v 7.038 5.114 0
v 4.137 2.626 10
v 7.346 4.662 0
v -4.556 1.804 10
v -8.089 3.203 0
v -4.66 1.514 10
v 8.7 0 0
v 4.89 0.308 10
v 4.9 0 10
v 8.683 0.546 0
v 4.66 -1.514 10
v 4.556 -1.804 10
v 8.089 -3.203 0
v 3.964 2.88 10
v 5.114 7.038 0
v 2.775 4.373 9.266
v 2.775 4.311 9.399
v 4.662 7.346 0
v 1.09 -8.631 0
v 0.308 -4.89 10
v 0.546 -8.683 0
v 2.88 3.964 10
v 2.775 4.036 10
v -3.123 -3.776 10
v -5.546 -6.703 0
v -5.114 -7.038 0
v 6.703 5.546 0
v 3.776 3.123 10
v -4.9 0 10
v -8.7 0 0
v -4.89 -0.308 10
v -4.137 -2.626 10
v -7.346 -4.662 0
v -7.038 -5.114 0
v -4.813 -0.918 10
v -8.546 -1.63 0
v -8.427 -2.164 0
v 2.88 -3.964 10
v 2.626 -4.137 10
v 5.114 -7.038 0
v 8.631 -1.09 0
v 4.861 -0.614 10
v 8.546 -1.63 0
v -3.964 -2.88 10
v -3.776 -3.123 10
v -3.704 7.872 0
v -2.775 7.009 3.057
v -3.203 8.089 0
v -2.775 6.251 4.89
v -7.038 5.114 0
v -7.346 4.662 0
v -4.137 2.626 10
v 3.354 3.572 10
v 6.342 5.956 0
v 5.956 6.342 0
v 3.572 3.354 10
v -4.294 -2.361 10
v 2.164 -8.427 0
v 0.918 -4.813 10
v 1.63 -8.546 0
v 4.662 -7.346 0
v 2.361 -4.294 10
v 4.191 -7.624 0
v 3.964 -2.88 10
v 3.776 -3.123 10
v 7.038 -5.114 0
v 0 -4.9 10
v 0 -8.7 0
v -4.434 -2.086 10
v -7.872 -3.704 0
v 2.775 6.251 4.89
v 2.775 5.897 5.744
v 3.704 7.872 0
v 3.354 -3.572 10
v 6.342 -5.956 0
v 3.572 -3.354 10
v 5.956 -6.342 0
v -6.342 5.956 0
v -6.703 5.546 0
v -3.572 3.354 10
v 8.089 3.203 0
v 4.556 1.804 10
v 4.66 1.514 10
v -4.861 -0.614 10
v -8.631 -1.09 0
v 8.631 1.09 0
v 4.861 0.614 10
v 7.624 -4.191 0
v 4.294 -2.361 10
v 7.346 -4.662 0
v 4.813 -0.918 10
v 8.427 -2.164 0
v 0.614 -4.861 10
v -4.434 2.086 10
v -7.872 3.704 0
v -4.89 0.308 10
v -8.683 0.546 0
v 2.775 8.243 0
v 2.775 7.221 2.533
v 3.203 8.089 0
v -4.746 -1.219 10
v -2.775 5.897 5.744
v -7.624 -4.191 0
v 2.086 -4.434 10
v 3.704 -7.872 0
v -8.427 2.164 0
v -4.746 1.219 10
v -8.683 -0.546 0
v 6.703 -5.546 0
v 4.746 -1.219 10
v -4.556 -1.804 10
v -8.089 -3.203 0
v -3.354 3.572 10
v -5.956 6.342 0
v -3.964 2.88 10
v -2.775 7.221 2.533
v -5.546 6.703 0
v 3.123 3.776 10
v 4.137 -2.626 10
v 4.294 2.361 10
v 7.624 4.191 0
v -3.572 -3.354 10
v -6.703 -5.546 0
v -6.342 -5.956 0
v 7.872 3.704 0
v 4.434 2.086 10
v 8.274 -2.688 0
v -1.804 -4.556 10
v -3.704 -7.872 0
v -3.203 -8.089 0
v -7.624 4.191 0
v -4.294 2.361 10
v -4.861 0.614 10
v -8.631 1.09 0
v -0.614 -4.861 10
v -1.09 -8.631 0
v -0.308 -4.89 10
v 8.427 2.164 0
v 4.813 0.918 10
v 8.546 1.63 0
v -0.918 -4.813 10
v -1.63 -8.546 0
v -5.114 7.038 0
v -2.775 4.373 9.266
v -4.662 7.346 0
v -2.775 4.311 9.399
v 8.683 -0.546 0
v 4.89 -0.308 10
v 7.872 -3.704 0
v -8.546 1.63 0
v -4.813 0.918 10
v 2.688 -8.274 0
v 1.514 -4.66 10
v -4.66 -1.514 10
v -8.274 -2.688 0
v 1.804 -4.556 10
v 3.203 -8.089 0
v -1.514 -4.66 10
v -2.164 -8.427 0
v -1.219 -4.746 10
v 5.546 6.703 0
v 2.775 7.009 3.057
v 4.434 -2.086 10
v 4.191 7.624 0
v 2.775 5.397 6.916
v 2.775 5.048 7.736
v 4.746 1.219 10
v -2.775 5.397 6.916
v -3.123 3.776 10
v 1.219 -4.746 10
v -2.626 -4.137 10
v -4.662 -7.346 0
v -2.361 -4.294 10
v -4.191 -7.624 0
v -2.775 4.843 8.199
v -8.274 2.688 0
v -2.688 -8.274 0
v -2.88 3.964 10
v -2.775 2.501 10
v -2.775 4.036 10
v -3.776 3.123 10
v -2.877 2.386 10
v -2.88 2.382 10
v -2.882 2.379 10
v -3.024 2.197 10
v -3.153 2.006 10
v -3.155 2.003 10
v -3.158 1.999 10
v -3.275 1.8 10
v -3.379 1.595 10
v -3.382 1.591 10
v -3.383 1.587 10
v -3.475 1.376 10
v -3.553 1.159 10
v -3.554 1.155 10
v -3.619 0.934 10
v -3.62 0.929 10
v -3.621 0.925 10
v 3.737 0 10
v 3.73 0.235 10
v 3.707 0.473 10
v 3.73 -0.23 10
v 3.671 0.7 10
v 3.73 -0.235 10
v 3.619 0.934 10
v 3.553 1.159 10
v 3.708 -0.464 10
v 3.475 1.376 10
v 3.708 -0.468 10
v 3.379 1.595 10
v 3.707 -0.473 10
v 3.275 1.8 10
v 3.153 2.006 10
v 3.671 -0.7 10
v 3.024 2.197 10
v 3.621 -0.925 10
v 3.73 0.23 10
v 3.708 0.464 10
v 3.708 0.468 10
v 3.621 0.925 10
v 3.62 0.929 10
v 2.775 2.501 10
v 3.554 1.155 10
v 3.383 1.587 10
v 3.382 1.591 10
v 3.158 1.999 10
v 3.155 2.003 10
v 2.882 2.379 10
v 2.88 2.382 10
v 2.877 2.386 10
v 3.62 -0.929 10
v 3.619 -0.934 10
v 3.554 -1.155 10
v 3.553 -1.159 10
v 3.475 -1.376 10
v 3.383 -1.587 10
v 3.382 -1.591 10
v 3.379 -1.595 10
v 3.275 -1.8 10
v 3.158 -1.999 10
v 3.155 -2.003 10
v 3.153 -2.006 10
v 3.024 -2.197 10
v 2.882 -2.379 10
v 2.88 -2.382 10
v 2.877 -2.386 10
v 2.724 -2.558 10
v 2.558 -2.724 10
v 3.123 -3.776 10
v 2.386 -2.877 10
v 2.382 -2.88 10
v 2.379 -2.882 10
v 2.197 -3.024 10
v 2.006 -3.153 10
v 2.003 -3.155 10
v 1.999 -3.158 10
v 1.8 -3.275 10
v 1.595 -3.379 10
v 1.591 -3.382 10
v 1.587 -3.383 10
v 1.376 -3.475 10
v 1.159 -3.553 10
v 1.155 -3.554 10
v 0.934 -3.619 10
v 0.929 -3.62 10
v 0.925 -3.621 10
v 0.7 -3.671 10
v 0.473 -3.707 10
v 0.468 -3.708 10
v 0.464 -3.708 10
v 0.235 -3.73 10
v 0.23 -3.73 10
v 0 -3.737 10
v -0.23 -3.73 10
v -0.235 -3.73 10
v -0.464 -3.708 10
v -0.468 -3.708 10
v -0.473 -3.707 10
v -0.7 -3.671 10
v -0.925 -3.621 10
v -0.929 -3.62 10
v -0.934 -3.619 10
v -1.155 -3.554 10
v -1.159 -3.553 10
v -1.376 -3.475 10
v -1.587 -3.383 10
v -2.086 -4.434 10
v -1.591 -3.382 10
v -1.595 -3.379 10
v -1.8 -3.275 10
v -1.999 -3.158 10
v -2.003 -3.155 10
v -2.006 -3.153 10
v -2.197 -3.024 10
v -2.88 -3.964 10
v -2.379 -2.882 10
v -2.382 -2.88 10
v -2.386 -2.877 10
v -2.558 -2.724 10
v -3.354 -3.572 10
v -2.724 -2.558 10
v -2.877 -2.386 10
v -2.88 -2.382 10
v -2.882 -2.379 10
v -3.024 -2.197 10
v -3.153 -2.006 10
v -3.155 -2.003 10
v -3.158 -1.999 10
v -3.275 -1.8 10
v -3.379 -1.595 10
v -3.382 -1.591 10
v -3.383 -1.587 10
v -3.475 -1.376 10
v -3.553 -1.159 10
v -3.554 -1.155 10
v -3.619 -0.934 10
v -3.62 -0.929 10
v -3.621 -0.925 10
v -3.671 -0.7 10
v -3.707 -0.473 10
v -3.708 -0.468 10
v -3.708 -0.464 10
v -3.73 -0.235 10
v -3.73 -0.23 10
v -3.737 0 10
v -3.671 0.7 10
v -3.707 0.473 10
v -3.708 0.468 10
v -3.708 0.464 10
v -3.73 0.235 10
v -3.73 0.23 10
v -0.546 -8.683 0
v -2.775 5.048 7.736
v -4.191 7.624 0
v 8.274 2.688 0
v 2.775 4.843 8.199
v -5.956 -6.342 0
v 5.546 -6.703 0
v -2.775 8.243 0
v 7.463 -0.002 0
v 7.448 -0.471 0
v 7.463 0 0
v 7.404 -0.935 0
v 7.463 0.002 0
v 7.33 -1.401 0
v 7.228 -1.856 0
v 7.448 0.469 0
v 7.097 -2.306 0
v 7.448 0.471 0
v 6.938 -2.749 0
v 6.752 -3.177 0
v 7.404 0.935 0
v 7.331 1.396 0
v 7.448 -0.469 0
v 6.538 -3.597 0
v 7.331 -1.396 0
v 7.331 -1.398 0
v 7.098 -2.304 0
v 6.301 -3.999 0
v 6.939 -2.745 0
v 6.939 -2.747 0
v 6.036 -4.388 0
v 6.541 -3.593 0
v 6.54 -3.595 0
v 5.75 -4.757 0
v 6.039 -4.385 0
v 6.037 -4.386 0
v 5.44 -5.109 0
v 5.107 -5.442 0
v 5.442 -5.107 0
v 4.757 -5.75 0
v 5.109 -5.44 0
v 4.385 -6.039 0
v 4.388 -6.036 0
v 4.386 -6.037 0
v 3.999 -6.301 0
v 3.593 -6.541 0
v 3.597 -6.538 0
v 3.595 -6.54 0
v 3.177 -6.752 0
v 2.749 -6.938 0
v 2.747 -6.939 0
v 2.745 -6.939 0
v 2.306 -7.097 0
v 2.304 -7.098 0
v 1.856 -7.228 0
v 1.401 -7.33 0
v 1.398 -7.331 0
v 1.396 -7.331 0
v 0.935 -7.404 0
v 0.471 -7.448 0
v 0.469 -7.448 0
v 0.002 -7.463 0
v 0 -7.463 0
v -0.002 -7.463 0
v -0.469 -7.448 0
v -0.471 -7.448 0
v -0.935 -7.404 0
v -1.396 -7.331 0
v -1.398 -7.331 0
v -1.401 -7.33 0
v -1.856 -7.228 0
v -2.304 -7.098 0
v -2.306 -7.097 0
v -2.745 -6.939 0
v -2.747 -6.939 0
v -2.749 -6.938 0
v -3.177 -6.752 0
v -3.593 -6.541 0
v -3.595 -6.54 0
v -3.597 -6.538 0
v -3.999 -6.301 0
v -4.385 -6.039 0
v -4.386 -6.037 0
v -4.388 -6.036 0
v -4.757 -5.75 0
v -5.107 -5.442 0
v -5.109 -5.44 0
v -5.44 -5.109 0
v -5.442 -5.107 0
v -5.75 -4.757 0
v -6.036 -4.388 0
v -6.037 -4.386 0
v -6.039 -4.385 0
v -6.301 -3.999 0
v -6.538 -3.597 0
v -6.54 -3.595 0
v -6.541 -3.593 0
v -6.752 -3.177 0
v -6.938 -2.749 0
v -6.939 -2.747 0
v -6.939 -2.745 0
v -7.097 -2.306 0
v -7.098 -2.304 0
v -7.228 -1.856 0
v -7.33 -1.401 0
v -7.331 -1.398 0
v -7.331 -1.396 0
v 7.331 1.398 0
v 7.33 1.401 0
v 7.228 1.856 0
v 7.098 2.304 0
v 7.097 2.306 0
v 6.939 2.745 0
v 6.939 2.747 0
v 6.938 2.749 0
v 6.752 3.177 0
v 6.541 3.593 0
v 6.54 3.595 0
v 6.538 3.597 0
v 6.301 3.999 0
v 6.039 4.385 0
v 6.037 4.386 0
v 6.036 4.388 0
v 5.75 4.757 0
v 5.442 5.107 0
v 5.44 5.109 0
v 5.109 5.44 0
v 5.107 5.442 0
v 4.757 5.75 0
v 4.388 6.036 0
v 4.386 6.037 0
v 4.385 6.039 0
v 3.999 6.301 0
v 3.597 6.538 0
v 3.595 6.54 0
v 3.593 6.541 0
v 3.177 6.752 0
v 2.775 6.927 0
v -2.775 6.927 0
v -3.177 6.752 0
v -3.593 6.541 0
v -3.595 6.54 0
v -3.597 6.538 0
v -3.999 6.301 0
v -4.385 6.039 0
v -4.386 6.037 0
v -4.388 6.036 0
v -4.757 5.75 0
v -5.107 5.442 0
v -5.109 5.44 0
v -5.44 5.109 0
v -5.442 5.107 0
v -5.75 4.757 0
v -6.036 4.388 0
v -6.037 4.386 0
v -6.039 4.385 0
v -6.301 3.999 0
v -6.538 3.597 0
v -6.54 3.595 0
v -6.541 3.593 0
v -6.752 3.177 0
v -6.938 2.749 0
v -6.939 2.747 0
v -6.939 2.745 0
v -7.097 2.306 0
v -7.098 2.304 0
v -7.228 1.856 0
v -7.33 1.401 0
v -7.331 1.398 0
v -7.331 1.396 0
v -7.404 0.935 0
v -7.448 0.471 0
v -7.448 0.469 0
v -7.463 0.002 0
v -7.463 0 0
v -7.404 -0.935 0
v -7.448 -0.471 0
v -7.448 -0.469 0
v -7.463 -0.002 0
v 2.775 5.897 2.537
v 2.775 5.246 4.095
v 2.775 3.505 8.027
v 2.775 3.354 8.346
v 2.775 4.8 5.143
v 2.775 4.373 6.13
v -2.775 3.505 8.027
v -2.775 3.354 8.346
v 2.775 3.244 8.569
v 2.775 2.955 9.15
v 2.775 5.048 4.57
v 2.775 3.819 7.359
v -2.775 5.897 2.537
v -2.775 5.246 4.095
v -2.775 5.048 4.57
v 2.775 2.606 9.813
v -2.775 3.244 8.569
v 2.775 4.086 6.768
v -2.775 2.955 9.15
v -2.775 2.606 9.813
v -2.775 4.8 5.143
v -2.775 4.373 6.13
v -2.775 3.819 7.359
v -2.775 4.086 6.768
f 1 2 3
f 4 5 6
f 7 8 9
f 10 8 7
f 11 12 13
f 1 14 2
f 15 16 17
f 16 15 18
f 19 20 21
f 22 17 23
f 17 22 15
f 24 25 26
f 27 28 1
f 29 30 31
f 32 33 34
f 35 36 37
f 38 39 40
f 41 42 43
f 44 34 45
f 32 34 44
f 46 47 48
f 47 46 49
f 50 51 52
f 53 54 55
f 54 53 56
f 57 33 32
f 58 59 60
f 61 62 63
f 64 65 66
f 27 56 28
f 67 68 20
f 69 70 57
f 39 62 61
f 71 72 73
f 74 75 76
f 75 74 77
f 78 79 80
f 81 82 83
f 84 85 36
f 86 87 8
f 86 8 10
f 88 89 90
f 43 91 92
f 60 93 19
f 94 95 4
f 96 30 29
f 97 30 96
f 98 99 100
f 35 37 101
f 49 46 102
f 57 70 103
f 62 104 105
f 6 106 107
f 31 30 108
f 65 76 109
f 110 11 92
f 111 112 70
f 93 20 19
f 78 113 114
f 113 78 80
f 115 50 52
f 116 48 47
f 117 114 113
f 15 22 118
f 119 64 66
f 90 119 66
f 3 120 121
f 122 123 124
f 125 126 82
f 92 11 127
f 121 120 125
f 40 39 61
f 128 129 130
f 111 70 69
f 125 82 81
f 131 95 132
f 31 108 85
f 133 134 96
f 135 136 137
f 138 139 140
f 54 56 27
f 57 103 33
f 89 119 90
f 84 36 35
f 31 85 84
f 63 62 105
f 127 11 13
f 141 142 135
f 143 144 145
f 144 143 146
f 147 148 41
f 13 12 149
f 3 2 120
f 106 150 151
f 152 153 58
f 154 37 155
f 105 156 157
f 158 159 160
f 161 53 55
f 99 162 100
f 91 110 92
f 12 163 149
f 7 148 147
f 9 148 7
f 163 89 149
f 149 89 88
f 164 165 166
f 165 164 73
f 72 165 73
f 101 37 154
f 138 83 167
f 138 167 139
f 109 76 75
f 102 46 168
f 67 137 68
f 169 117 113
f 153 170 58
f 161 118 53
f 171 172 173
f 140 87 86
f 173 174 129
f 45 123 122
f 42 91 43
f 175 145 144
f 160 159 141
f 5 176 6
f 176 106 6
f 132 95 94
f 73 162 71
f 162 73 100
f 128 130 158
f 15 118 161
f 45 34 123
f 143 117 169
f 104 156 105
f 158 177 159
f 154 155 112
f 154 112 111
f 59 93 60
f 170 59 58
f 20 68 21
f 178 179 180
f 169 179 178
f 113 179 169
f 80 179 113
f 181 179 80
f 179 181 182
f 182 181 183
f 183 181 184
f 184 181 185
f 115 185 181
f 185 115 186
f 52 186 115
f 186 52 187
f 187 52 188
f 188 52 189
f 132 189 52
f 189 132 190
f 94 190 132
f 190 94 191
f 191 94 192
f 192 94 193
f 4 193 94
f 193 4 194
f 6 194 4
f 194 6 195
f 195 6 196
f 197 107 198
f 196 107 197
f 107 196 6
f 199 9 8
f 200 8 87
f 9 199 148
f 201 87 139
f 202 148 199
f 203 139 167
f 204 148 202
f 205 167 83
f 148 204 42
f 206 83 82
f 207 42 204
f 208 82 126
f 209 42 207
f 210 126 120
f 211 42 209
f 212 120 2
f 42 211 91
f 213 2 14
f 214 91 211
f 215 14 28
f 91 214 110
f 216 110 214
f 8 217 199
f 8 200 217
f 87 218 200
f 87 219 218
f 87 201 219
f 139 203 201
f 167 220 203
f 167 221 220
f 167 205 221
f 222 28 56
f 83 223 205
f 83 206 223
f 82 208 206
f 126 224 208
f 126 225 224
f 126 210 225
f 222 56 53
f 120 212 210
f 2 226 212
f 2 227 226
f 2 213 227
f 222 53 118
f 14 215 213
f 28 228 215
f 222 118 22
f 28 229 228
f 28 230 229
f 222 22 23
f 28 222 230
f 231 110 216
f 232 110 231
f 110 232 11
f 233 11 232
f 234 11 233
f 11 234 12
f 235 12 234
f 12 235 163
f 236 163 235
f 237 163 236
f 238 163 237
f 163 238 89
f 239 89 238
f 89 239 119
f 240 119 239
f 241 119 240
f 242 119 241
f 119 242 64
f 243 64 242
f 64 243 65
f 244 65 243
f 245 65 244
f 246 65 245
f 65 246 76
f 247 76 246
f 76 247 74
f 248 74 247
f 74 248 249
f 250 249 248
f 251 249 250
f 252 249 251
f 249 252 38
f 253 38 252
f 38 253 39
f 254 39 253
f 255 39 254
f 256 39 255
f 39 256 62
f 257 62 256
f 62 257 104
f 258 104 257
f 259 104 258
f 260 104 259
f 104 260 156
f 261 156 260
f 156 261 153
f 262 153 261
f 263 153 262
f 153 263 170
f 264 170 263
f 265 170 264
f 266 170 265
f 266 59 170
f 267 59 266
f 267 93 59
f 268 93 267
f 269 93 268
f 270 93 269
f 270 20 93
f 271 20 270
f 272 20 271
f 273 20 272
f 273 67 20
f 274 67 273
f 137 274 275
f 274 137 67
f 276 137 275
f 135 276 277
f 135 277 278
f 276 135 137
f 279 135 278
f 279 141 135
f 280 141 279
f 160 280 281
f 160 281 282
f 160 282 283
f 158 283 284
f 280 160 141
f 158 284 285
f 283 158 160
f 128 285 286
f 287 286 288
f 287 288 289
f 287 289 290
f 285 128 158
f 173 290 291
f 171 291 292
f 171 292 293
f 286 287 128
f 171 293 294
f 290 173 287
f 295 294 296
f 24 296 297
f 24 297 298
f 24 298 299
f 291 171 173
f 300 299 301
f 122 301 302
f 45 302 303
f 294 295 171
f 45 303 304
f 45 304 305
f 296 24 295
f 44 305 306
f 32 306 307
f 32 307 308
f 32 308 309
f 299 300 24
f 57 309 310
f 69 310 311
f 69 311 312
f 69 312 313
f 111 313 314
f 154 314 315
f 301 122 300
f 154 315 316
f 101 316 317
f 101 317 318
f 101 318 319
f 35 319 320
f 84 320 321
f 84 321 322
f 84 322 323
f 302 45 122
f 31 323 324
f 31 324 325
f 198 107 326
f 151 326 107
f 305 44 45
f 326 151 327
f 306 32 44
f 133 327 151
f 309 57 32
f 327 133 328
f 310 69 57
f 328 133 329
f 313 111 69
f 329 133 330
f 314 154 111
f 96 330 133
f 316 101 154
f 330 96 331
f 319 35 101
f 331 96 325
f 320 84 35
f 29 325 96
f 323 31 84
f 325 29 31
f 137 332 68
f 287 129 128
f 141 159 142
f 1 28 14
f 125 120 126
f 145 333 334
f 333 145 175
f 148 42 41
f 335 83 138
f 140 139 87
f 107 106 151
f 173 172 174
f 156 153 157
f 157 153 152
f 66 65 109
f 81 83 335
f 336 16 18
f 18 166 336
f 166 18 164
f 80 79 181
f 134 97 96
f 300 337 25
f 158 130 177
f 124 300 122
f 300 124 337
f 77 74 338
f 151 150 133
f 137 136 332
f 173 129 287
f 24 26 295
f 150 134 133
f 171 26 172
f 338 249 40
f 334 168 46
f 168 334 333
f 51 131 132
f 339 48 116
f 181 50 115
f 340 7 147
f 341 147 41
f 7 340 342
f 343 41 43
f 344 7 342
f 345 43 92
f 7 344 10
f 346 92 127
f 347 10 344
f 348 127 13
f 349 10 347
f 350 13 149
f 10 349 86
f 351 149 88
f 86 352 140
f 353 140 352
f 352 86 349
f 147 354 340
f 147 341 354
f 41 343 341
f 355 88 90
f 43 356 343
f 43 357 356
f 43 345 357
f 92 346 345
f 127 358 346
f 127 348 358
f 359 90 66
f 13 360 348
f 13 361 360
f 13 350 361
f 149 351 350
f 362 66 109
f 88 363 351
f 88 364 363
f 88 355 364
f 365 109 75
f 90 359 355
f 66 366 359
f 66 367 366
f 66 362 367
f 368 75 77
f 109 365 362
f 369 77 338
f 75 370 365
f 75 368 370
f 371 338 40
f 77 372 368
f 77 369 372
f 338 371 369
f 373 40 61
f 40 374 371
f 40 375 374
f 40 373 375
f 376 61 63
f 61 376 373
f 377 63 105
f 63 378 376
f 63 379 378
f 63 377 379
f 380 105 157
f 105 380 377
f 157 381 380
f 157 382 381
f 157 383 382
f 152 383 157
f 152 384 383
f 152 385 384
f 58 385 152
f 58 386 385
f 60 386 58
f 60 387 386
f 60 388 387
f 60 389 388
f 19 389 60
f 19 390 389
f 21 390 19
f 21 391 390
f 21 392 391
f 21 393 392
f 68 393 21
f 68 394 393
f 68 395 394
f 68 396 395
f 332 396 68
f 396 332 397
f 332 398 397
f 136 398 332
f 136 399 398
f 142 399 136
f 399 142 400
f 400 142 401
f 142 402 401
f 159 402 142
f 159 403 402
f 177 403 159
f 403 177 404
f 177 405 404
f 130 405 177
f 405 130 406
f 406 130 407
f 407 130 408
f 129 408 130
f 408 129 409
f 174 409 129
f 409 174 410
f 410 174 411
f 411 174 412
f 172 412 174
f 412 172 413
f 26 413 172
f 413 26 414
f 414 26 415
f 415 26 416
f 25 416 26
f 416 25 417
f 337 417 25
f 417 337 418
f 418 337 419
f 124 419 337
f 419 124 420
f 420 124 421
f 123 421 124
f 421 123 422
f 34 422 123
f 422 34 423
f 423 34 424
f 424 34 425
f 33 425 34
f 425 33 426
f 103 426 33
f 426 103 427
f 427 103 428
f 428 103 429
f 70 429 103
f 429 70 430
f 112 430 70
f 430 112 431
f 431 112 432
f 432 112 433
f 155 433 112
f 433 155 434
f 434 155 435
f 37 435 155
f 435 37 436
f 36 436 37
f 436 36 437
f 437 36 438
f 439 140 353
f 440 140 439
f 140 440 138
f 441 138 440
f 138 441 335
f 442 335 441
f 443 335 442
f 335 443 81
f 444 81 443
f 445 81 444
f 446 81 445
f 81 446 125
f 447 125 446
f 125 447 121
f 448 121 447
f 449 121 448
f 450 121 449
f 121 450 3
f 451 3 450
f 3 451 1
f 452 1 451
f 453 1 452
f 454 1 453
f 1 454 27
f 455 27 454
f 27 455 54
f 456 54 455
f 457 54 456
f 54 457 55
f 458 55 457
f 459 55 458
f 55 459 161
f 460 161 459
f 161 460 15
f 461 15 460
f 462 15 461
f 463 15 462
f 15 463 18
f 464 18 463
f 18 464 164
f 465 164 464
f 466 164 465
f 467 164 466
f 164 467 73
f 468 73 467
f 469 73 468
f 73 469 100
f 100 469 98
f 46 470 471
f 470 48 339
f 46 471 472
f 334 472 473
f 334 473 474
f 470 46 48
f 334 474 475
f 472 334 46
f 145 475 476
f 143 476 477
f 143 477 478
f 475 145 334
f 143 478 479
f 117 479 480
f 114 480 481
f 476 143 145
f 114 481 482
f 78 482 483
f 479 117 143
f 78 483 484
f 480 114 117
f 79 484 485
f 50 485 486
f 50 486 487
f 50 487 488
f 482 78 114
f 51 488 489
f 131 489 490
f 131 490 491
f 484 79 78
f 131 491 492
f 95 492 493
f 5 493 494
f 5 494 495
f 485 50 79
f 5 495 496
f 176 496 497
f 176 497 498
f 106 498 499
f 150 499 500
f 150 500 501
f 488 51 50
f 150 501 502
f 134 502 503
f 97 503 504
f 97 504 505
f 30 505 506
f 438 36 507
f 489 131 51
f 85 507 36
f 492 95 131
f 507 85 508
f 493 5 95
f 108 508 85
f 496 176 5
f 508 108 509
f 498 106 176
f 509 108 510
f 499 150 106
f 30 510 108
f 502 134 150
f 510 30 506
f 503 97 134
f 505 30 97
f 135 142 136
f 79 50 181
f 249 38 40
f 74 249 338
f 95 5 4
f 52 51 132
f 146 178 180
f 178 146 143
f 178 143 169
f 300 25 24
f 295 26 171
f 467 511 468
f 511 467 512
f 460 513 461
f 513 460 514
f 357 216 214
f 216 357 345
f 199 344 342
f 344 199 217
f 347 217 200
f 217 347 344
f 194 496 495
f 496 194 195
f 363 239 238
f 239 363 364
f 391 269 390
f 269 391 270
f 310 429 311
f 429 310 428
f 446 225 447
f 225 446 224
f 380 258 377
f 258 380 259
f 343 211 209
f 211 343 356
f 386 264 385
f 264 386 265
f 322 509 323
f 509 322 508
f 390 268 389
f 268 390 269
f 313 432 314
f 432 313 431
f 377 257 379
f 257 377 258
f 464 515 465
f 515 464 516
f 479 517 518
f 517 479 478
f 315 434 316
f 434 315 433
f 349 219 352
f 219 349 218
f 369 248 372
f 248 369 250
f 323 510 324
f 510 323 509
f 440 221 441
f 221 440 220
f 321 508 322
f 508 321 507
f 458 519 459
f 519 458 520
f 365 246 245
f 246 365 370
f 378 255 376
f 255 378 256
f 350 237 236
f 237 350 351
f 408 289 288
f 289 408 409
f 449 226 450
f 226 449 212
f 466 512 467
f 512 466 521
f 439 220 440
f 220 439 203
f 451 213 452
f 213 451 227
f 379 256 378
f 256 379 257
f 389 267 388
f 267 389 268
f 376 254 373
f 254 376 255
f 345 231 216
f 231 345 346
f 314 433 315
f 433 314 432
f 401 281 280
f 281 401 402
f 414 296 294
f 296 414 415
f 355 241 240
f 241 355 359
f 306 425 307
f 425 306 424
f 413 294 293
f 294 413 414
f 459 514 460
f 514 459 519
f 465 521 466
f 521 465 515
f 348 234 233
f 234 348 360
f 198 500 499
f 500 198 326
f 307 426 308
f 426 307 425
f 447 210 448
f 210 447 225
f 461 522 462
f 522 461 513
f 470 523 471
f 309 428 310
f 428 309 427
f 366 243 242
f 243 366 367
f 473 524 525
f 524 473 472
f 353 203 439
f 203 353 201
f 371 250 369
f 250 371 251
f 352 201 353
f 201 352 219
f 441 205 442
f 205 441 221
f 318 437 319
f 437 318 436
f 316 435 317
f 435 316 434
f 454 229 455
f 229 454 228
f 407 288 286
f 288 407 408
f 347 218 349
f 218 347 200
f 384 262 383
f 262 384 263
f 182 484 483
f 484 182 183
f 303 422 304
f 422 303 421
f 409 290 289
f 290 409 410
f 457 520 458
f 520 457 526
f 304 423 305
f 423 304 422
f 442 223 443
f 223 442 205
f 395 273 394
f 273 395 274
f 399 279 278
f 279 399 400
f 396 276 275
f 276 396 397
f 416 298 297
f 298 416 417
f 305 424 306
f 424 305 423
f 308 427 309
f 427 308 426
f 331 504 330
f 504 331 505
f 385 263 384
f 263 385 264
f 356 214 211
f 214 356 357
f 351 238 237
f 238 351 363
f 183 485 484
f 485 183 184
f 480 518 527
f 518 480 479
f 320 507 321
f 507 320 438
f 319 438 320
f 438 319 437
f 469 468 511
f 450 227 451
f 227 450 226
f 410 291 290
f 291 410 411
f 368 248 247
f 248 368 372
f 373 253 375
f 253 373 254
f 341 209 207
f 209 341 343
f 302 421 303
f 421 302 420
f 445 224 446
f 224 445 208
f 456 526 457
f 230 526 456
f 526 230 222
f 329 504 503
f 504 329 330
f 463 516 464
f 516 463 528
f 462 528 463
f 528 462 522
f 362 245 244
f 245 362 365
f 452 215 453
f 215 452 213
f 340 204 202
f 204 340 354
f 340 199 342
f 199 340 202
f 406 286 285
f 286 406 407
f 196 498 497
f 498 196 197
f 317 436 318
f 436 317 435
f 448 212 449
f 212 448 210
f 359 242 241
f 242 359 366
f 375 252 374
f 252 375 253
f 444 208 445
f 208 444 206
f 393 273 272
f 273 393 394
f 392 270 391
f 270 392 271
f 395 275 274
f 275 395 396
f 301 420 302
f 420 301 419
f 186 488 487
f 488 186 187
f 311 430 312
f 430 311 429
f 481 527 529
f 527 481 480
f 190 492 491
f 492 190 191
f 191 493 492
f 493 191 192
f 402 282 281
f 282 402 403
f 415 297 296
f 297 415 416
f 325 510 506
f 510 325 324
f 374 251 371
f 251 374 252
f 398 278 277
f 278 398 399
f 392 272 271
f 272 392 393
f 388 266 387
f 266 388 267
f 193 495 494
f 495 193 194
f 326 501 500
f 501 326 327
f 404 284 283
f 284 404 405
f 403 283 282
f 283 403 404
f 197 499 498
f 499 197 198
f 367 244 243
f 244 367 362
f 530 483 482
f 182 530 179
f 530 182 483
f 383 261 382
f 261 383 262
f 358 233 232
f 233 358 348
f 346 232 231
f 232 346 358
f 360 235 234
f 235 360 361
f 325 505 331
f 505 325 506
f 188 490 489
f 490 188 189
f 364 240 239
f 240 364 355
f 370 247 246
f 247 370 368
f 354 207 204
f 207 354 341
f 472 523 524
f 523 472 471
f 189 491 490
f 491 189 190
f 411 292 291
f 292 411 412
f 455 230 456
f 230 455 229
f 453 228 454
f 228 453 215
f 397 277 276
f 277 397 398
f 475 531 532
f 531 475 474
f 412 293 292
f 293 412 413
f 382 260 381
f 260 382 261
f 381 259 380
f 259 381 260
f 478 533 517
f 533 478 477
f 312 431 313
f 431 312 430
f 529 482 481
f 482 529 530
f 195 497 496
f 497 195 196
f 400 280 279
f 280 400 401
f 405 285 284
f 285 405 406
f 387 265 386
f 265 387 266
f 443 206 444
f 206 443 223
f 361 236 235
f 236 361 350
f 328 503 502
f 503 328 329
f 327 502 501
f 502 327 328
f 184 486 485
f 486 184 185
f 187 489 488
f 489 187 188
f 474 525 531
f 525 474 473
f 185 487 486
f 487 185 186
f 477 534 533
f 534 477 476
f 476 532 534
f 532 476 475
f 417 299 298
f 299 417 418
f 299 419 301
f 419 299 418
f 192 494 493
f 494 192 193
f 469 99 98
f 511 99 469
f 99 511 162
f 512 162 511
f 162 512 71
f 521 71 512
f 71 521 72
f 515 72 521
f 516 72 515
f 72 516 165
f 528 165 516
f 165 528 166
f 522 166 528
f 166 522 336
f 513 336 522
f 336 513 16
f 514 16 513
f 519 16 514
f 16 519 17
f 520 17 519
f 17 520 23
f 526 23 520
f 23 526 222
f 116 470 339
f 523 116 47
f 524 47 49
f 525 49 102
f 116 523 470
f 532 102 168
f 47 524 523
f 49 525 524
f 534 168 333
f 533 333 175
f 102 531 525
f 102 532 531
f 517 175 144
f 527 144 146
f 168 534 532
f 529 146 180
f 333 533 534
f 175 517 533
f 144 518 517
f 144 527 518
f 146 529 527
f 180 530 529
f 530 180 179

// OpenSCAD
$fn=100;

ds=7.4;
dl=15;
hl=10;
t=1.2;
s=ds/4*3;

difference(){
    union(){
        cylinder(d1=dl+t*2, d2=ds+t*2, h=hl);

        //cylinder(d=ds+t*2, h=hl*2);
    }
    
    translate([0,0,-.1])
    cylinder(d1=dl, d2=ds, h=hl+.2);

    cylinder(d=ds, h=hl*2+.2);

    translate([-s/2,0,-.1])
    cube([s,dl+t*3,hl*3]);
}
